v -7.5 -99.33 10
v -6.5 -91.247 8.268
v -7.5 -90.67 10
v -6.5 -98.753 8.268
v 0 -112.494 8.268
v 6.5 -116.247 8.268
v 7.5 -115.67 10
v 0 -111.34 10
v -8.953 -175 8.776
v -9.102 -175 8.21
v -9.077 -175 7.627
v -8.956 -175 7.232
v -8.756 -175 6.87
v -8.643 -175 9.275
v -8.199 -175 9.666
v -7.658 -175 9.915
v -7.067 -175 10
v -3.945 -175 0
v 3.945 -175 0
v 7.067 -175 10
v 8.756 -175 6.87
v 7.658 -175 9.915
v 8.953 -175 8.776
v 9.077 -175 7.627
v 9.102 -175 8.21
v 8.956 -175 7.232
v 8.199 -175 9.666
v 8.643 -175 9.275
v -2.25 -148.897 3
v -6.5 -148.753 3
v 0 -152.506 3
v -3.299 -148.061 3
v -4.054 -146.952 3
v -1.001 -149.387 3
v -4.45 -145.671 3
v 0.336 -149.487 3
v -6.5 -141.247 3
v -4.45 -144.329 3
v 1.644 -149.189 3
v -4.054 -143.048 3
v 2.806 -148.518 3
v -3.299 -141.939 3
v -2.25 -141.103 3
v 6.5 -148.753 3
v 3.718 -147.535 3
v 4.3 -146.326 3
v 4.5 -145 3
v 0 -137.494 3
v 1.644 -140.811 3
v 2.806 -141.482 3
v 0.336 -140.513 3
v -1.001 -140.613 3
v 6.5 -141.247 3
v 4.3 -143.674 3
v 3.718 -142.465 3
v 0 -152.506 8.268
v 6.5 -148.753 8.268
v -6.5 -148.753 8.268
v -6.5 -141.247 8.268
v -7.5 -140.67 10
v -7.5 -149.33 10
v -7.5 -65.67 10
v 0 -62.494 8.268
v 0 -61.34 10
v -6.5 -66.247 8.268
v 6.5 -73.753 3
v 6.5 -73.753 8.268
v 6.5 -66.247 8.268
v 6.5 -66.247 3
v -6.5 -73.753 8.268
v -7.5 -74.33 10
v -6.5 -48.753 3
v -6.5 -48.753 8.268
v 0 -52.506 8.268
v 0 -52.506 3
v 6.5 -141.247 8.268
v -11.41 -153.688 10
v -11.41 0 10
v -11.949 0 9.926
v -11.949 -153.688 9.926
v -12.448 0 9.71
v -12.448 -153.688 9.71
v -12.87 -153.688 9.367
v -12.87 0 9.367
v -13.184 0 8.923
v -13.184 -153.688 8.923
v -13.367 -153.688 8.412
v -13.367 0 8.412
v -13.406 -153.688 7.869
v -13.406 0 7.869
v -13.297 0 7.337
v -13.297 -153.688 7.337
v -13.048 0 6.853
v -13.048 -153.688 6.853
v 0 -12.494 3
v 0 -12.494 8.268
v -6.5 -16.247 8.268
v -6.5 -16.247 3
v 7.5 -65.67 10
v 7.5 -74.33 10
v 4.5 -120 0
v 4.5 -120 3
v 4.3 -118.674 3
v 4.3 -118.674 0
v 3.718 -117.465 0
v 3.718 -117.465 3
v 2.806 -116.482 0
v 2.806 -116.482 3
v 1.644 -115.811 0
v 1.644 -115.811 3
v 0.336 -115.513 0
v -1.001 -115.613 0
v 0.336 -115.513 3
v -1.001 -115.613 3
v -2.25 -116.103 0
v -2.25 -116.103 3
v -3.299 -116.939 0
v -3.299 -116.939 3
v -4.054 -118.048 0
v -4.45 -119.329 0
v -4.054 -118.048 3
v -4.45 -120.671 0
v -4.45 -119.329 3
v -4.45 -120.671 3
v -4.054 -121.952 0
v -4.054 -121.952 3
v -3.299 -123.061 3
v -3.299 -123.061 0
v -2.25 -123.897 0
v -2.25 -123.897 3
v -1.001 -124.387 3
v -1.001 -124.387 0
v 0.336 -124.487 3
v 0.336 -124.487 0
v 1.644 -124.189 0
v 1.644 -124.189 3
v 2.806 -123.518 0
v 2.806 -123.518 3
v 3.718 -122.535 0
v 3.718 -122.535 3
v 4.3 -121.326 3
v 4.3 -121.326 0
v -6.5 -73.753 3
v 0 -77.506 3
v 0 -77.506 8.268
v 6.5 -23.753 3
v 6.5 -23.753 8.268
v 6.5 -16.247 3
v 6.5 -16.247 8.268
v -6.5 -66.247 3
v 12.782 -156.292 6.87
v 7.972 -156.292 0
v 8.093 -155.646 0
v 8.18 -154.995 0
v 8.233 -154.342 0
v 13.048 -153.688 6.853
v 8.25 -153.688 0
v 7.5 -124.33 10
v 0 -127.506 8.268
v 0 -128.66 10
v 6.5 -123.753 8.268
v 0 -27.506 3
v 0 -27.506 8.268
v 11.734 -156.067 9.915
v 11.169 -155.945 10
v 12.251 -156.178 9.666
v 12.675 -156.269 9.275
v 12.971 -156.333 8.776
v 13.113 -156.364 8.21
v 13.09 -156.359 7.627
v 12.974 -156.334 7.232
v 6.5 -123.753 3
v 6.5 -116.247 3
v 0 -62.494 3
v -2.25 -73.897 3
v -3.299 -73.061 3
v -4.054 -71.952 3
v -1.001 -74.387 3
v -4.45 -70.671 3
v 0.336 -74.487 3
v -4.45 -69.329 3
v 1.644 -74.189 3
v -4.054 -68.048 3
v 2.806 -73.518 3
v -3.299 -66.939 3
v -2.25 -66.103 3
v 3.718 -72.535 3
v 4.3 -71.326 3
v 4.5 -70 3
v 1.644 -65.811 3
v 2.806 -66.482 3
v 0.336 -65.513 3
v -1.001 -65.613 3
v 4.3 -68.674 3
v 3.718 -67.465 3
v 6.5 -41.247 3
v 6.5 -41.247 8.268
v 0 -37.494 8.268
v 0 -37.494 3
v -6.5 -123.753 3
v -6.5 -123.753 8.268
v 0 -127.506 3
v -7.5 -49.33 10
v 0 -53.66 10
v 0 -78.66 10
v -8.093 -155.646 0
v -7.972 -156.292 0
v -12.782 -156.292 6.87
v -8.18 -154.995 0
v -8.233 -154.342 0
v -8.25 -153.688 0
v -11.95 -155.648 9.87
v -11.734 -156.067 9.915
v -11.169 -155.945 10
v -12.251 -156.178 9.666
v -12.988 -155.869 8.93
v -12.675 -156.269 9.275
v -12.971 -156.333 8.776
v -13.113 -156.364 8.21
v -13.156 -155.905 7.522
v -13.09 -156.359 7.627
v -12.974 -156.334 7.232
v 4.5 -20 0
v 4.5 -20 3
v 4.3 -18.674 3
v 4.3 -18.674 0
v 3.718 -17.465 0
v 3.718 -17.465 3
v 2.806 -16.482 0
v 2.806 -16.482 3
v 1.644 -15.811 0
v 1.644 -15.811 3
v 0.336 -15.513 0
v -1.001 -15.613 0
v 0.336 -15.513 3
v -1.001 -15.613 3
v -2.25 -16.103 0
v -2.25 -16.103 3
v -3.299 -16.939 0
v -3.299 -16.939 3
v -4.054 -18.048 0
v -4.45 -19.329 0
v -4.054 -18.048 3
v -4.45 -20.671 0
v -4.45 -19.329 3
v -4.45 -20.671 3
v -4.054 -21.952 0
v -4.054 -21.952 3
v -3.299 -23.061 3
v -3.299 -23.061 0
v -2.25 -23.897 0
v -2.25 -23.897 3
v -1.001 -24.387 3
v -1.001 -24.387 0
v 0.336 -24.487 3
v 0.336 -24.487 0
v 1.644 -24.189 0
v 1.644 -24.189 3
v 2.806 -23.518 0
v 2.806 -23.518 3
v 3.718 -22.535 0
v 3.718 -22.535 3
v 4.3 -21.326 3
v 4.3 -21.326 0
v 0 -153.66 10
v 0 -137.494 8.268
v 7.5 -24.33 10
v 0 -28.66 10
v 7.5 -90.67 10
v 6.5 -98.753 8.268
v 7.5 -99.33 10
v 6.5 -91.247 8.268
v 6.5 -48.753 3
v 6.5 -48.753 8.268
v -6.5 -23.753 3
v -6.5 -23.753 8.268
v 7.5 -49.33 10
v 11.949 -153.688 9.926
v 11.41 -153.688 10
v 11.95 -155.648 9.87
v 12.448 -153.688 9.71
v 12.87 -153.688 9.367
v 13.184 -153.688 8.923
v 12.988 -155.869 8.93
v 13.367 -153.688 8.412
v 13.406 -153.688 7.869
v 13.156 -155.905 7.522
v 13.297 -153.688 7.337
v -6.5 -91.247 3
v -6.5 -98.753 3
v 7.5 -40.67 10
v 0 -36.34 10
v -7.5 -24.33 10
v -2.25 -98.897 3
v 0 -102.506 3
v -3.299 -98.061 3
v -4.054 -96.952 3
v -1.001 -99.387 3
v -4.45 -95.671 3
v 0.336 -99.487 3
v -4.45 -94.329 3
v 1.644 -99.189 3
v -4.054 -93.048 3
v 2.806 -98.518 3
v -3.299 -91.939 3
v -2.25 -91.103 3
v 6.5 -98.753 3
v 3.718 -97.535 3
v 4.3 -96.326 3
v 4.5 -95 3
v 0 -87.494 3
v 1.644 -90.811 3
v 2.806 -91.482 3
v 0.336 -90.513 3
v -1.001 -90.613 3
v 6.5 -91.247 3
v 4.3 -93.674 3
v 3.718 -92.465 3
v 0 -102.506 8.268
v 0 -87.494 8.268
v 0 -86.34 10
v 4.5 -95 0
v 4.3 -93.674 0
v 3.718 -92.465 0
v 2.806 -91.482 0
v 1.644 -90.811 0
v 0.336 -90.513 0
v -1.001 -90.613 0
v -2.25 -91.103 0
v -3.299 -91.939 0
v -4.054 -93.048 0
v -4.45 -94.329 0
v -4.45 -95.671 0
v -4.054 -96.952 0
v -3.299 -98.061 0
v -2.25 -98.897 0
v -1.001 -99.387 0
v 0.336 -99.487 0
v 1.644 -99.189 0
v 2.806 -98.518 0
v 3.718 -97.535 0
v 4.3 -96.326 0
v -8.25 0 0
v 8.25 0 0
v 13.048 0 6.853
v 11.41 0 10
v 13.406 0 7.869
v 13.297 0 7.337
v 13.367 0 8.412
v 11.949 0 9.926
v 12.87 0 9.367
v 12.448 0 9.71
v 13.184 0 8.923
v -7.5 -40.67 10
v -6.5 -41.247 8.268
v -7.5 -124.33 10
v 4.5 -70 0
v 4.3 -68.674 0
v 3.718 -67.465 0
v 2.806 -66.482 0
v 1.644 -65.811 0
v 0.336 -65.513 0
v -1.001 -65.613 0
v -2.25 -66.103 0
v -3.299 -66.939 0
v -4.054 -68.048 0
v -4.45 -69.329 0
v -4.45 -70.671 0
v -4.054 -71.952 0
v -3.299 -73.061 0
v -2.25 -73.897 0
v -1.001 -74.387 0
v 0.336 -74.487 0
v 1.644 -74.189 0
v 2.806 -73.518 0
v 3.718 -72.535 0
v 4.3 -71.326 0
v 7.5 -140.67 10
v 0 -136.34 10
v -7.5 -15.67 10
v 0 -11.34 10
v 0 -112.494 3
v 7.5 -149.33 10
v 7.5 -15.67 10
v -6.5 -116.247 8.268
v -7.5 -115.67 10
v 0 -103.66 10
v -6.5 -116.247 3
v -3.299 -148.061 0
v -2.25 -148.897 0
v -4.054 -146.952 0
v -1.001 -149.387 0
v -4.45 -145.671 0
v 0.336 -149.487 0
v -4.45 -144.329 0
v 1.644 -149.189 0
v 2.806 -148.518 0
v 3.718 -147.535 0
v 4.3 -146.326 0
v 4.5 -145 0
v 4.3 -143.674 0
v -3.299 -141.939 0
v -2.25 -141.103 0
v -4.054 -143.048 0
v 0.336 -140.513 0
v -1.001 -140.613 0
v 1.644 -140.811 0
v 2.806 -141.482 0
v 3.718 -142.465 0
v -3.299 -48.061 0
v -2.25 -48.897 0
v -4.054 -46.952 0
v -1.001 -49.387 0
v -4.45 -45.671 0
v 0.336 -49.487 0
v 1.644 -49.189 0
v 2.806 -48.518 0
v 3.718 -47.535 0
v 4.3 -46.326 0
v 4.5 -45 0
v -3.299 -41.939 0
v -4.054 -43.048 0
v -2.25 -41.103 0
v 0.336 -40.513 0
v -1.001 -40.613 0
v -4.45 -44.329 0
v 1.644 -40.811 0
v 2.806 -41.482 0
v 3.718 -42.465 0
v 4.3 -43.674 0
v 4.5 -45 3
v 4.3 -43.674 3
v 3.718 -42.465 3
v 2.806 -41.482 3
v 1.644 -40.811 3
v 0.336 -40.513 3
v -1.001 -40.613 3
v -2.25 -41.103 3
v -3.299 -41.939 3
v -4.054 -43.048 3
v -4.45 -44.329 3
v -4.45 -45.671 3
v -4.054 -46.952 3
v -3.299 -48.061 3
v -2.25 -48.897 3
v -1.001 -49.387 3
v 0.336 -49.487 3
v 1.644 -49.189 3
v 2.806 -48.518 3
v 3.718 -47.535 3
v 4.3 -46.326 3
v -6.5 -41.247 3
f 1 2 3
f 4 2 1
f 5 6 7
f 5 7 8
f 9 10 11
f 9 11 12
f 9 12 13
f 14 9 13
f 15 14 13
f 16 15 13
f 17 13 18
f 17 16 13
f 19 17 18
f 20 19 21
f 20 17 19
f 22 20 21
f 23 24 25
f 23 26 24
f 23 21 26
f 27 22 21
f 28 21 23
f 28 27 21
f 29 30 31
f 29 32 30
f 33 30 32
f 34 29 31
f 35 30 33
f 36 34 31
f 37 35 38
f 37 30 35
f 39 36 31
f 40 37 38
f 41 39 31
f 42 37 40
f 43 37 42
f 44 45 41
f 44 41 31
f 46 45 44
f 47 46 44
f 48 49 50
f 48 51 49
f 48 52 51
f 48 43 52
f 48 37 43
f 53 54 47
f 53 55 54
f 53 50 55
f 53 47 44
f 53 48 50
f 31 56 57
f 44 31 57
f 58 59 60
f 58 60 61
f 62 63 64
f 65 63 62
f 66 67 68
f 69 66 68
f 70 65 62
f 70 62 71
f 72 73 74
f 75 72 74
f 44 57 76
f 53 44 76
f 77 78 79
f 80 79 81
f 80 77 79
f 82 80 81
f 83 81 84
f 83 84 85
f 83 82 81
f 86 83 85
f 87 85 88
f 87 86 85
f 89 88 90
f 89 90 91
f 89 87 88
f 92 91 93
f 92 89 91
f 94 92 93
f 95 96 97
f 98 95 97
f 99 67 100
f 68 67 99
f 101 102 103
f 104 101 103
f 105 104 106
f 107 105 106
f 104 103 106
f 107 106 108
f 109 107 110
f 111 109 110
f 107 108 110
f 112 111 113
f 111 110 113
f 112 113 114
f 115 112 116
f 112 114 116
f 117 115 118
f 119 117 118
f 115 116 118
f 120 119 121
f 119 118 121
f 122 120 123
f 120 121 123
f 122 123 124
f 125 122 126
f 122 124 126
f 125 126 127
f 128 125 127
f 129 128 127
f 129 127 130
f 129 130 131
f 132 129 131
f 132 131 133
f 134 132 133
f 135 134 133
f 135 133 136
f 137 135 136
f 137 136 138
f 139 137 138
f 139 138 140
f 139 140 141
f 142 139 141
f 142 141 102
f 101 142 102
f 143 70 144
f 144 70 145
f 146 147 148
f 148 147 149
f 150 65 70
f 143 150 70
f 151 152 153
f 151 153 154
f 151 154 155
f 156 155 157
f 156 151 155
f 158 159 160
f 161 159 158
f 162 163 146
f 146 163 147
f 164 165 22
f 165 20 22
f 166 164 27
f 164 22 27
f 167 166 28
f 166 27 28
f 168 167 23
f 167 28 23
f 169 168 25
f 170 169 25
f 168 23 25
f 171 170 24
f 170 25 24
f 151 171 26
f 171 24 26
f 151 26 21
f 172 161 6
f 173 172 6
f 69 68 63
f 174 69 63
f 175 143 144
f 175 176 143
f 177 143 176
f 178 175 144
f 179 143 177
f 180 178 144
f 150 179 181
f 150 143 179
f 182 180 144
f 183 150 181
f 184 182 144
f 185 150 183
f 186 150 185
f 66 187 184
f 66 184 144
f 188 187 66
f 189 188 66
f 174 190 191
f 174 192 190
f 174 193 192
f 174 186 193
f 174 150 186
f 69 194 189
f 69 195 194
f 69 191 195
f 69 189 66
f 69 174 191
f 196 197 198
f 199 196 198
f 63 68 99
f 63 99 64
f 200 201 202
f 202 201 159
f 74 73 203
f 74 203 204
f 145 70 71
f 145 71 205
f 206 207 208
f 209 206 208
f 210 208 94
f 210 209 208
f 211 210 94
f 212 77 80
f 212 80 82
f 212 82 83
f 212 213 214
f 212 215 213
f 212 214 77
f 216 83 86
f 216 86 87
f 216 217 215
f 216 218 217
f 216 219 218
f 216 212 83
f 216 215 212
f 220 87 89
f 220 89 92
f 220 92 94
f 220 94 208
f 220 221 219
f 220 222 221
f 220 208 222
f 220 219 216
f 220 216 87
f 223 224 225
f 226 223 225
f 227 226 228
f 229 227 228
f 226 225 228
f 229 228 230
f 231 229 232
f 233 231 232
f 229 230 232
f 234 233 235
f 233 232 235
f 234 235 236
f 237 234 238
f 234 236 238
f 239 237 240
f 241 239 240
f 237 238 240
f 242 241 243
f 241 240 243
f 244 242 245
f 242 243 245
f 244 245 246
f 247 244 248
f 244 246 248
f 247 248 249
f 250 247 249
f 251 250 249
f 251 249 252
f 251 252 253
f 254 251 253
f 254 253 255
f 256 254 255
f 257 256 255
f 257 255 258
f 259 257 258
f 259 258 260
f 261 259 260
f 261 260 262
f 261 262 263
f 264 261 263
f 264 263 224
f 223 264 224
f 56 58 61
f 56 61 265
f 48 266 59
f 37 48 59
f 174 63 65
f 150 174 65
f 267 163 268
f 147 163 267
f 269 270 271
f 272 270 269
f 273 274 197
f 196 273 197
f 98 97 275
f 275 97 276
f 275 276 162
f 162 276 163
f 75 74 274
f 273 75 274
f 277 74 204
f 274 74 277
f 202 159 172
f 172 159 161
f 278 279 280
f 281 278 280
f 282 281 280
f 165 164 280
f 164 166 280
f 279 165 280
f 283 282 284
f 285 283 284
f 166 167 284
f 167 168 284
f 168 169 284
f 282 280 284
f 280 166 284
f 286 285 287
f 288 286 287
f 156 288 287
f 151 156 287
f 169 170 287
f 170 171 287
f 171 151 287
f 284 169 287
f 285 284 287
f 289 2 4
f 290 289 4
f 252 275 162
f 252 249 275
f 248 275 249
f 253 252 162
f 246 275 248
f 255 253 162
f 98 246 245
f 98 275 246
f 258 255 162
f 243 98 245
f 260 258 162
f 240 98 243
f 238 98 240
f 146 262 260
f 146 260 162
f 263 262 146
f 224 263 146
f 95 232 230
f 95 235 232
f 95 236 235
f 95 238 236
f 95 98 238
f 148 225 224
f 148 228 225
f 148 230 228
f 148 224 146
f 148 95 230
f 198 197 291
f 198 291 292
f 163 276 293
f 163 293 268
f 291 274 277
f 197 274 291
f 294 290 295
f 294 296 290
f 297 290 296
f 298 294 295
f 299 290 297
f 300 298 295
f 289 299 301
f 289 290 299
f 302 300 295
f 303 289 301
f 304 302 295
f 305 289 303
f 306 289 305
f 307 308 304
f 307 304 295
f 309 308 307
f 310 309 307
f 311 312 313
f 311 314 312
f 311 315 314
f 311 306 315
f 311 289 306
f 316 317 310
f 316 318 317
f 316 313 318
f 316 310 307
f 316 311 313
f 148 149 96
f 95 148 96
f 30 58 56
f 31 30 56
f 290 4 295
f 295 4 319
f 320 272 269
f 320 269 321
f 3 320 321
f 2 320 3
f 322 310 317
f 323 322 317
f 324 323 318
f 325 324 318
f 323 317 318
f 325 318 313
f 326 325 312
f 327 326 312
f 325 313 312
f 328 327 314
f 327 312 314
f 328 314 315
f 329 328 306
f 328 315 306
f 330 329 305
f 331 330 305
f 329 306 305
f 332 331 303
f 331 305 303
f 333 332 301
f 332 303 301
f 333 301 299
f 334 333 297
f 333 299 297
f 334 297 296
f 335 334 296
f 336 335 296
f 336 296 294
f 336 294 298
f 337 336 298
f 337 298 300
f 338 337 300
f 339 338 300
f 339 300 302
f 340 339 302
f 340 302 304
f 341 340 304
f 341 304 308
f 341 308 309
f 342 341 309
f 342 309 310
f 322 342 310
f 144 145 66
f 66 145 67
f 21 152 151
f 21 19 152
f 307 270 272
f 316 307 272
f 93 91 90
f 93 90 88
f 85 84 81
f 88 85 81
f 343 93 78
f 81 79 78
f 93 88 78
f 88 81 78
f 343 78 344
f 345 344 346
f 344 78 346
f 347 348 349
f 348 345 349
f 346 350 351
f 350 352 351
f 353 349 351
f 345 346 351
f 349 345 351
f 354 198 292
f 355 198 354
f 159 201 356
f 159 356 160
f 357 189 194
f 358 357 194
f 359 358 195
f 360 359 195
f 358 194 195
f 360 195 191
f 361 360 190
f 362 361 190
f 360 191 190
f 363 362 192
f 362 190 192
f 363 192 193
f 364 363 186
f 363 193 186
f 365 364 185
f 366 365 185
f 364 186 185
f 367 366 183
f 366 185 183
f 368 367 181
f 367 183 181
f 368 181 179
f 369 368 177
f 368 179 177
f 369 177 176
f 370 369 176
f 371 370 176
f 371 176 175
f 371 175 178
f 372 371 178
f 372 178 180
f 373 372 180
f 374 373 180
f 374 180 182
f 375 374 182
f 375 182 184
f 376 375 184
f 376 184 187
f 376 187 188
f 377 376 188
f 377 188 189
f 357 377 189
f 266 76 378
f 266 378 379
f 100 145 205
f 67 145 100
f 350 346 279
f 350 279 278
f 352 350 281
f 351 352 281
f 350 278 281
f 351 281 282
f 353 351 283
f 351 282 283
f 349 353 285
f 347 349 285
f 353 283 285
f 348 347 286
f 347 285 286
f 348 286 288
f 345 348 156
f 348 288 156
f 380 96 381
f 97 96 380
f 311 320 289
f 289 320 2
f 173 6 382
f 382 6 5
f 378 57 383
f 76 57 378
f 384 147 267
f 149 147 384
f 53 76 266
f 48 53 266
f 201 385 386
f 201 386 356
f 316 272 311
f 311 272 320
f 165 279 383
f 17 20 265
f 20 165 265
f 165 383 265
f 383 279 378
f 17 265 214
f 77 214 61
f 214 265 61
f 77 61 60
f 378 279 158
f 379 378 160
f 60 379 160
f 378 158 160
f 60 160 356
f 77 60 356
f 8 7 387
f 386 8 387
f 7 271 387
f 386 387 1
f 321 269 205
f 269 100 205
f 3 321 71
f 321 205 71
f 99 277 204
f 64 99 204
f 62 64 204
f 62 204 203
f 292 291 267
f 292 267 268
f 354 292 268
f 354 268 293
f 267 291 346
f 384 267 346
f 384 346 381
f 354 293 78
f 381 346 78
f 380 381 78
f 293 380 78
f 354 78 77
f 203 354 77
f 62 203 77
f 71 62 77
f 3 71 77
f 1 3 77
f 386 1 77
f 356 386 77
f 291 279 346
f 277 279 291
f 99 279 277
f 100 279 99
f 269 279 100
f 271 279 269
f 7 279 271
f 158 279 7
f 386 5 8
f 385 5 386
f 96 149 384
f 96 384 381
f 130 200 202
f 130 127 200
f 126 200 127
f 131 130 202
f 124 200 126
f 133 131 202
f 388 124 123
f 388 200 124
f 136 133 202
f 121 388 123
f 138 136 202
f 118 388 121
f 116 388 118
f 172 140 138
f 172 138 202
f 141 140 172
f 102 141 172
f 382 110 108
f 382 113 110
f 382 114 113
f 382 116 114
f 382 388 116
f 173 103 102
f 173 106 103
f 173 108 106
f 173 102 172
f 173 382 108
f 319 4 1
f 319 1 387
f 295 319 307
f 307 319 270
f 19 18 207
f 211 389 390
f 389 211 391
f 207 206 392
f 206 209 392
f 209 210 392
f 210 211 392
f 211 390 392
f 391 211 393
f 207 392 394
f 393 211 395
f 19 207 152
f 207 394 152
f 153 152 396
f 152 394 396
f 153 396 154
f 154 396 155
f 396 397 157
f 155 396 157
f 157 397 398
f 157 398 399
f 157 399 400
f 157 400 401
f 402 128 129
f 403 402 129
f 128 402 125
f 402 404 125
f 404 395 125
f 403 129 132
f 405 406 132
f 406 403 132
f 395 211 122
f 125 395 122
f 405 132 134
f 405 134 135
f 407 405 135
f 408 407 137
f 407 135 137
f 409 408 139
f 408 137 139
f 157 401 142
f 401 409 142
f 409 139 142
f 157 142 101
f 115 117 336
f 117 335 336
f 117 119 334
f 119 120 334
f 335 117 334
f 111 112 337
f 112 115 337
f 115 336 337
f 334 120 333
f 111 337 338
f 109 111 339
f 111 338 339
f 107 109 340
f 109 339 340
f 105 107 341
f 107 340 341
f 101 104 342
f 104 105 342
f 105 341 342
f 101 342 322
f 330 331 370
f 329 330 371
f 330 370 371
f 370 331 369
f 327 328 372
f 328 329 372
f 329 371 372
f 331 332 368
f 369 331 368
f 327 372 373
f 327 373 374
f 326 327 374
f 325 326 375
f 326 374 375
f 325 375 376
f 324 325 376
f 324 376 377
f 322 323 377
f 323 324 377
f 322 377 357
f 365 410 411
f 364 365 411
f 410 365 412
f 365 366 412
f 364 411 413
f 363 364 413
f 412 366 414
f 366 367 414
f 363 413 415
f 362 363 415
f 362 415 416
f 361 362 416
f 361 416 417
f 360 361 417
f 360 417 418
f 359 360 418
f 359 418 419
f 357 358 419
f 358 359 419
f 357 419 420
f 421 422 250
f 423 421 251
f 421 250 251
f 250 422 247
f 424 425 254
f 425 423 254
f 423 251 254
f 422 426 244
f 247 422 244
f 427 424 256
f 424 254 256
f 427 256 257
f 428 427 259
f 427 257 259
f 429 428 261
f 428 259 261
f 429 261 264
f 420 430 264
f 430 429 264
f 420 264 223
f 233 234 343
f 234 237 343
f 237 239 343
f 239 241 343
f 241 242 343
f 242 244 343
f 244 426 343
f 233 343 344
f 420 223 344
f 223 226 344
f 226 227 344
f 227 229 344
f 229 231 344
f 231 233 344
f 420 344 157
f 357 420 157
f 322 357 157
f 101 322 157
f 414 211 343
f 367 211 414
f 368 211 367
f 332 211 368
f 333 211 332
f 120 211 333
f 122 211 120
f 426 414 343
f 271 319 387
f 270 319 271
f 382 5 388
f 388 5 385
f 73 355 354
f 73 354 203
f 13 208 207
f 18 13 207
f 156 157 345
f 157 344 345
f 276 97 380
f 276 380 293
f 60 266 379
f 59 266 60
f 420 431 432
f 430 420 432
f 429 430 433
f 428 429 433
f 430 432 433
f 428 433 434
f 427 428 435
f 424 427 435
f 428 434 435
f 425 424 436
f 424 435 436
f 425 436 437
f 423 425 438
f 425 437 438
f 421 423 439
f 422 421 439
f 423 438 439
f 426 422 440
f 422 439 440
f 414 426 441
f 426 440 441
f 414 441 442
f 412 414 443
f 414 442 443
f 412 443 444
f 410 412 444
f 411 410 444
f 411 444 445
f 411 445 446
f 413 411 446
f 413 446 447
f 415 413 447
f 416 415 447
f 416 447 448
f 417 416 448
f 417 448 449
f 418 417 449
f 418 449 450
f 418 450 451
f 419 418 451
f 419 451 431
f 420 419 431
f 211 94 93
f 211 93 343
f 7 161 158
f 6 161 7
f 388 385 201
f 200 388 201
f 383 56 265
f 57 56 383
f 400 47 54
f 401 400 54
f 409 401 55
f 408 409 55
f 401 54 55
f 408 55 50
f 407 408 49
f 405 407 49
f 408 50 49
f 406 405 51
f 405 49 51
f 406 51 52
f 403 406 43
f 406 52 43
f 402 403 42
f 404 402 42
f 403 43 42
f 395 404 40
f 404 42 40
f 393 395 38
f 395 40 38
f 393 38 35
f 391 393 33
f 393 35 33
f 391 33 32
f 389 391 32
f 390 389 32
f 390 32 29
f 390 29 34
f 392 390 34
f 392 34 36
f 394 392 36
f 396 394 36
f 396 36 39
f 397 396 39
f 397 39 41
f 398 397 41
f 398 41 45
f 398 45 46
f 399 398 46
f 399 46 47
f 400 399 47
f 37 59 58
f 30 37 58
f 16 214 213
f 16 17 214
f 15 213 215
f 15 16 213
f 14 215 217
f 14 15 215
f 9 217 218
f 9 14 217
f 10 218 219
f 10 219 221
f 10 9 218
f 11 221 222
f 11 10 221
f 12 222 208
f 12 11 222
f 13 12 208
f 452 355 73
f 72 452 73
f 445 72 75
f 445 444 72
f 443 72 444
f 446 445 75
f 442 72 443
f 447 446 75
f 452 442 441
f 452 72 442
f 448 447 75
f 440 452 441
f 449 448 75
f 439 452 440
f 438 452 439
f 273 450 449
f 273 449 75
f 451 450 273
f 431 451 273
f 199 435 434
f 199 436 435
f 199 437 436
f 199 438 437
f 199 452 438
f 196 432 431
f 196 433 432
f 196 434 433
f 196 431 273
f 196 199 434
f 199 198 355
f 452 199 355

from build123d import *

# Parameters (mm, degrees)
F1_DEPTH   = 175
F2_R       = 4.5
F3_DEPTH   = 7
F4_DEPTH   = 25
F5_SIZE2   = 1.7320508076
F5_SIZE    = 1
F6_SIZE2   = 3.5265396142
F6_SIZE    = 20
F6_2_SIZE2 = 3.5265396142
F6_2_SIZE  = 20
F7_R       = 15
F8_R       = 2


with BuildPart() as f1:
    # F0 (on Front) → F1 (new body)
    with BuildSketch(Plane.XZ):
        Polygon((-15.2520753821, 10), (-8.25, 0), (8.25, 0), (15.2520753821, 10), align=None)
    extrude(amount=F1_DEPTH)

    # F2 (on face) → F3 (cut)
    with BuildSketch(Plane.XY.offset(10)):
        Polygon((6.5, -23.7527767497), (6.5, -16.2472232503), (0, -12.4944465005), (-6.5, -16.2472232503), (-6.5, -23.7527767497), (0, -27.5055534995), align=None)
        with Locations((0, -20)):
            Circle(F2_R, mode=Mode.SUBTRACT)
        Polygon((-6.5, -41.2472232503), (-6.5, -48.7527767497), (0, -52.5055534995), (6.5, -48.7527767497), (6.5, -41.2472232503), (0, -37.4944465005), align=None)
        with Locations((0, -45)):
            Circle(F2_R, mode=Mode.SUBTRACT)
        Polygon((-6.5, -66.2472232503), (-6.5, -73.7527767497), (0, -77.5055534995), (6.5, -73.7527767497), (6.5, -66.2472232503), (0, -62.4944465005), align=None)
        with Locations((0, -70)):
            Circle(F2_R, mode=Mode.SUBTRACT)
        Polygon((-6.5, -91.2472232503), (-6.5, -98.7527767497), (0, -102.5055534995), (6.5, -98.7527767497), (6.5, -91.2472232503), (0, -87.4944465005), align=None)
        with Locations((0, -95)):
            Circle(F2_R, mode=Mode.SUBTRACT)
        Polygon((-6.5, -116.2472232503), (-6.5, -123.7527767497), (0, -127.5055534995), (6.5, -123.7527767497), (6.5, -116.2472232503), (0, -112.4944465005), align=None)
        with Locations((0, -120)):
            Circle(F2_R, mode=Mode.SUBTRACT)
        Polygon((-6.5, -141.2472232503), (-6.5, -148.7527767497), (0, -152.5055534995), (6.5, -148.7527767497), (6.5, -141.2472232503), (0, -137.4944465005), align=None)
        with Locations((0, -145)):
            Circle(F2_R, mode=Mode.SUBTRACT)
    extrude(amount=-F3_DEPTH, mode=Mode.SUBTRACT)

    # F4 (cut): faces of the model
    f4_faces = [f1.faces().sort_by_distance(p)[0] for p in [
        (0, -20, 10),
        (0, -45, 10),
        (0, -70, 10),
        (0, -95, 10),
        (0, -120, 10),
        (0, -145, 10),
    ]]
    extrude(f4_faces, amount=-F4_DEPTH, mode=Mode.SUBTRACT)

    # F5
    f5_edges = [f1.edges().sort_by_distance(p)[0] for p in [
        (-6.5, -145, 10),
        (-3.25, -139.370835, 10),
        (-3.25, -150.629165, 10),
        (3.25, -150.629165, 10),
        (6.5, -145, 10),
        (3.25, -139.370835, 10),
        (-3.25, -125.629165, 10),
        (-6.5, -120, 10),
        (-3.25, -114.370835, 10),
        (3.25, -114.370835, 10),
        (6.5, -120, 10),
        (3.25, -125.629165, 10),
        (-6.5, -95, 10),
        (-3.25, -89.370835, 10),
        (3.25, -89.370835, 10),
        (6.5, -95, 10),
        (3.25, -100.629165, 10),
        (-3.25, -100.629165, 10),
        (-3.25, -75.629165, 10),
        (-6.5, -70, 10),
        (-3.25, -64.370835, 10),
        (3.25, -64.370835, 10),
        (6.5, -70, 10),
        (3.25, -75.629165, 10),
        (-6.5, -45, 10),
        (-3.25, -39.370835, 10),
        (3.25, -39.370835, 10),
        (6.5, -45, 10),
        (3.25, -50.629165, 10),
        (-3.25, -50.629165, 10),
        (-3.25, -25.629165, 10),
        (-6.5, -20, 10),
        (-3.25, -14.370835, 10),
        (3.25, -14.370835, 10),
        (6.5, -20, 10),
        (3.25, -25.629165, 10),
    ]]
    chamfer(f5_edges, length=F5_SIZE, length2=F5_SIZE2)

    # F6
    f6_edges = [f1.edges().sort_by_distance(p)[0] for p in [
        (-11.751038, -175, 5),
    ]]
    f6_side = f1.faces().sort_by_distance((-11.751038, -87.5, 5))[0]
    chamfer(f6_edges, length=F6_SIZE, length2=F6_SIZE2, reference=f6_side)

    # F6#2
    f6_2_edges = [f1.edges().sort_by_distance(p)[0] for p in [
        (11.751038, -175, 5),
    ]]
    f6_2_side = f1.faces().sort_by_distance((11.751038, -87.5, 5))[0]
    chamfer(f6_2_edges, length=F6_2_SIZE, length2=F6_2_SIZE2, reference=f6_2_side)

    # F7
    f7_edges = [f1.edges().sort_by_distance(p)[0] for p in [
        (-11.751038, -155, 5),
        (11.751038, -155, 5),
    ]]
    fillet(f7_edges, radius=F7_R)

    # F8
    f8_edges = [f1.edges().sort_by_distance(p)[0] for p in [
        (12.960423, -165.646196, 10),
        (-12.960423, -165.646196, 10),
    ]]
    fillet(f8_edges, radius=F8_R)


solid = f1.part
